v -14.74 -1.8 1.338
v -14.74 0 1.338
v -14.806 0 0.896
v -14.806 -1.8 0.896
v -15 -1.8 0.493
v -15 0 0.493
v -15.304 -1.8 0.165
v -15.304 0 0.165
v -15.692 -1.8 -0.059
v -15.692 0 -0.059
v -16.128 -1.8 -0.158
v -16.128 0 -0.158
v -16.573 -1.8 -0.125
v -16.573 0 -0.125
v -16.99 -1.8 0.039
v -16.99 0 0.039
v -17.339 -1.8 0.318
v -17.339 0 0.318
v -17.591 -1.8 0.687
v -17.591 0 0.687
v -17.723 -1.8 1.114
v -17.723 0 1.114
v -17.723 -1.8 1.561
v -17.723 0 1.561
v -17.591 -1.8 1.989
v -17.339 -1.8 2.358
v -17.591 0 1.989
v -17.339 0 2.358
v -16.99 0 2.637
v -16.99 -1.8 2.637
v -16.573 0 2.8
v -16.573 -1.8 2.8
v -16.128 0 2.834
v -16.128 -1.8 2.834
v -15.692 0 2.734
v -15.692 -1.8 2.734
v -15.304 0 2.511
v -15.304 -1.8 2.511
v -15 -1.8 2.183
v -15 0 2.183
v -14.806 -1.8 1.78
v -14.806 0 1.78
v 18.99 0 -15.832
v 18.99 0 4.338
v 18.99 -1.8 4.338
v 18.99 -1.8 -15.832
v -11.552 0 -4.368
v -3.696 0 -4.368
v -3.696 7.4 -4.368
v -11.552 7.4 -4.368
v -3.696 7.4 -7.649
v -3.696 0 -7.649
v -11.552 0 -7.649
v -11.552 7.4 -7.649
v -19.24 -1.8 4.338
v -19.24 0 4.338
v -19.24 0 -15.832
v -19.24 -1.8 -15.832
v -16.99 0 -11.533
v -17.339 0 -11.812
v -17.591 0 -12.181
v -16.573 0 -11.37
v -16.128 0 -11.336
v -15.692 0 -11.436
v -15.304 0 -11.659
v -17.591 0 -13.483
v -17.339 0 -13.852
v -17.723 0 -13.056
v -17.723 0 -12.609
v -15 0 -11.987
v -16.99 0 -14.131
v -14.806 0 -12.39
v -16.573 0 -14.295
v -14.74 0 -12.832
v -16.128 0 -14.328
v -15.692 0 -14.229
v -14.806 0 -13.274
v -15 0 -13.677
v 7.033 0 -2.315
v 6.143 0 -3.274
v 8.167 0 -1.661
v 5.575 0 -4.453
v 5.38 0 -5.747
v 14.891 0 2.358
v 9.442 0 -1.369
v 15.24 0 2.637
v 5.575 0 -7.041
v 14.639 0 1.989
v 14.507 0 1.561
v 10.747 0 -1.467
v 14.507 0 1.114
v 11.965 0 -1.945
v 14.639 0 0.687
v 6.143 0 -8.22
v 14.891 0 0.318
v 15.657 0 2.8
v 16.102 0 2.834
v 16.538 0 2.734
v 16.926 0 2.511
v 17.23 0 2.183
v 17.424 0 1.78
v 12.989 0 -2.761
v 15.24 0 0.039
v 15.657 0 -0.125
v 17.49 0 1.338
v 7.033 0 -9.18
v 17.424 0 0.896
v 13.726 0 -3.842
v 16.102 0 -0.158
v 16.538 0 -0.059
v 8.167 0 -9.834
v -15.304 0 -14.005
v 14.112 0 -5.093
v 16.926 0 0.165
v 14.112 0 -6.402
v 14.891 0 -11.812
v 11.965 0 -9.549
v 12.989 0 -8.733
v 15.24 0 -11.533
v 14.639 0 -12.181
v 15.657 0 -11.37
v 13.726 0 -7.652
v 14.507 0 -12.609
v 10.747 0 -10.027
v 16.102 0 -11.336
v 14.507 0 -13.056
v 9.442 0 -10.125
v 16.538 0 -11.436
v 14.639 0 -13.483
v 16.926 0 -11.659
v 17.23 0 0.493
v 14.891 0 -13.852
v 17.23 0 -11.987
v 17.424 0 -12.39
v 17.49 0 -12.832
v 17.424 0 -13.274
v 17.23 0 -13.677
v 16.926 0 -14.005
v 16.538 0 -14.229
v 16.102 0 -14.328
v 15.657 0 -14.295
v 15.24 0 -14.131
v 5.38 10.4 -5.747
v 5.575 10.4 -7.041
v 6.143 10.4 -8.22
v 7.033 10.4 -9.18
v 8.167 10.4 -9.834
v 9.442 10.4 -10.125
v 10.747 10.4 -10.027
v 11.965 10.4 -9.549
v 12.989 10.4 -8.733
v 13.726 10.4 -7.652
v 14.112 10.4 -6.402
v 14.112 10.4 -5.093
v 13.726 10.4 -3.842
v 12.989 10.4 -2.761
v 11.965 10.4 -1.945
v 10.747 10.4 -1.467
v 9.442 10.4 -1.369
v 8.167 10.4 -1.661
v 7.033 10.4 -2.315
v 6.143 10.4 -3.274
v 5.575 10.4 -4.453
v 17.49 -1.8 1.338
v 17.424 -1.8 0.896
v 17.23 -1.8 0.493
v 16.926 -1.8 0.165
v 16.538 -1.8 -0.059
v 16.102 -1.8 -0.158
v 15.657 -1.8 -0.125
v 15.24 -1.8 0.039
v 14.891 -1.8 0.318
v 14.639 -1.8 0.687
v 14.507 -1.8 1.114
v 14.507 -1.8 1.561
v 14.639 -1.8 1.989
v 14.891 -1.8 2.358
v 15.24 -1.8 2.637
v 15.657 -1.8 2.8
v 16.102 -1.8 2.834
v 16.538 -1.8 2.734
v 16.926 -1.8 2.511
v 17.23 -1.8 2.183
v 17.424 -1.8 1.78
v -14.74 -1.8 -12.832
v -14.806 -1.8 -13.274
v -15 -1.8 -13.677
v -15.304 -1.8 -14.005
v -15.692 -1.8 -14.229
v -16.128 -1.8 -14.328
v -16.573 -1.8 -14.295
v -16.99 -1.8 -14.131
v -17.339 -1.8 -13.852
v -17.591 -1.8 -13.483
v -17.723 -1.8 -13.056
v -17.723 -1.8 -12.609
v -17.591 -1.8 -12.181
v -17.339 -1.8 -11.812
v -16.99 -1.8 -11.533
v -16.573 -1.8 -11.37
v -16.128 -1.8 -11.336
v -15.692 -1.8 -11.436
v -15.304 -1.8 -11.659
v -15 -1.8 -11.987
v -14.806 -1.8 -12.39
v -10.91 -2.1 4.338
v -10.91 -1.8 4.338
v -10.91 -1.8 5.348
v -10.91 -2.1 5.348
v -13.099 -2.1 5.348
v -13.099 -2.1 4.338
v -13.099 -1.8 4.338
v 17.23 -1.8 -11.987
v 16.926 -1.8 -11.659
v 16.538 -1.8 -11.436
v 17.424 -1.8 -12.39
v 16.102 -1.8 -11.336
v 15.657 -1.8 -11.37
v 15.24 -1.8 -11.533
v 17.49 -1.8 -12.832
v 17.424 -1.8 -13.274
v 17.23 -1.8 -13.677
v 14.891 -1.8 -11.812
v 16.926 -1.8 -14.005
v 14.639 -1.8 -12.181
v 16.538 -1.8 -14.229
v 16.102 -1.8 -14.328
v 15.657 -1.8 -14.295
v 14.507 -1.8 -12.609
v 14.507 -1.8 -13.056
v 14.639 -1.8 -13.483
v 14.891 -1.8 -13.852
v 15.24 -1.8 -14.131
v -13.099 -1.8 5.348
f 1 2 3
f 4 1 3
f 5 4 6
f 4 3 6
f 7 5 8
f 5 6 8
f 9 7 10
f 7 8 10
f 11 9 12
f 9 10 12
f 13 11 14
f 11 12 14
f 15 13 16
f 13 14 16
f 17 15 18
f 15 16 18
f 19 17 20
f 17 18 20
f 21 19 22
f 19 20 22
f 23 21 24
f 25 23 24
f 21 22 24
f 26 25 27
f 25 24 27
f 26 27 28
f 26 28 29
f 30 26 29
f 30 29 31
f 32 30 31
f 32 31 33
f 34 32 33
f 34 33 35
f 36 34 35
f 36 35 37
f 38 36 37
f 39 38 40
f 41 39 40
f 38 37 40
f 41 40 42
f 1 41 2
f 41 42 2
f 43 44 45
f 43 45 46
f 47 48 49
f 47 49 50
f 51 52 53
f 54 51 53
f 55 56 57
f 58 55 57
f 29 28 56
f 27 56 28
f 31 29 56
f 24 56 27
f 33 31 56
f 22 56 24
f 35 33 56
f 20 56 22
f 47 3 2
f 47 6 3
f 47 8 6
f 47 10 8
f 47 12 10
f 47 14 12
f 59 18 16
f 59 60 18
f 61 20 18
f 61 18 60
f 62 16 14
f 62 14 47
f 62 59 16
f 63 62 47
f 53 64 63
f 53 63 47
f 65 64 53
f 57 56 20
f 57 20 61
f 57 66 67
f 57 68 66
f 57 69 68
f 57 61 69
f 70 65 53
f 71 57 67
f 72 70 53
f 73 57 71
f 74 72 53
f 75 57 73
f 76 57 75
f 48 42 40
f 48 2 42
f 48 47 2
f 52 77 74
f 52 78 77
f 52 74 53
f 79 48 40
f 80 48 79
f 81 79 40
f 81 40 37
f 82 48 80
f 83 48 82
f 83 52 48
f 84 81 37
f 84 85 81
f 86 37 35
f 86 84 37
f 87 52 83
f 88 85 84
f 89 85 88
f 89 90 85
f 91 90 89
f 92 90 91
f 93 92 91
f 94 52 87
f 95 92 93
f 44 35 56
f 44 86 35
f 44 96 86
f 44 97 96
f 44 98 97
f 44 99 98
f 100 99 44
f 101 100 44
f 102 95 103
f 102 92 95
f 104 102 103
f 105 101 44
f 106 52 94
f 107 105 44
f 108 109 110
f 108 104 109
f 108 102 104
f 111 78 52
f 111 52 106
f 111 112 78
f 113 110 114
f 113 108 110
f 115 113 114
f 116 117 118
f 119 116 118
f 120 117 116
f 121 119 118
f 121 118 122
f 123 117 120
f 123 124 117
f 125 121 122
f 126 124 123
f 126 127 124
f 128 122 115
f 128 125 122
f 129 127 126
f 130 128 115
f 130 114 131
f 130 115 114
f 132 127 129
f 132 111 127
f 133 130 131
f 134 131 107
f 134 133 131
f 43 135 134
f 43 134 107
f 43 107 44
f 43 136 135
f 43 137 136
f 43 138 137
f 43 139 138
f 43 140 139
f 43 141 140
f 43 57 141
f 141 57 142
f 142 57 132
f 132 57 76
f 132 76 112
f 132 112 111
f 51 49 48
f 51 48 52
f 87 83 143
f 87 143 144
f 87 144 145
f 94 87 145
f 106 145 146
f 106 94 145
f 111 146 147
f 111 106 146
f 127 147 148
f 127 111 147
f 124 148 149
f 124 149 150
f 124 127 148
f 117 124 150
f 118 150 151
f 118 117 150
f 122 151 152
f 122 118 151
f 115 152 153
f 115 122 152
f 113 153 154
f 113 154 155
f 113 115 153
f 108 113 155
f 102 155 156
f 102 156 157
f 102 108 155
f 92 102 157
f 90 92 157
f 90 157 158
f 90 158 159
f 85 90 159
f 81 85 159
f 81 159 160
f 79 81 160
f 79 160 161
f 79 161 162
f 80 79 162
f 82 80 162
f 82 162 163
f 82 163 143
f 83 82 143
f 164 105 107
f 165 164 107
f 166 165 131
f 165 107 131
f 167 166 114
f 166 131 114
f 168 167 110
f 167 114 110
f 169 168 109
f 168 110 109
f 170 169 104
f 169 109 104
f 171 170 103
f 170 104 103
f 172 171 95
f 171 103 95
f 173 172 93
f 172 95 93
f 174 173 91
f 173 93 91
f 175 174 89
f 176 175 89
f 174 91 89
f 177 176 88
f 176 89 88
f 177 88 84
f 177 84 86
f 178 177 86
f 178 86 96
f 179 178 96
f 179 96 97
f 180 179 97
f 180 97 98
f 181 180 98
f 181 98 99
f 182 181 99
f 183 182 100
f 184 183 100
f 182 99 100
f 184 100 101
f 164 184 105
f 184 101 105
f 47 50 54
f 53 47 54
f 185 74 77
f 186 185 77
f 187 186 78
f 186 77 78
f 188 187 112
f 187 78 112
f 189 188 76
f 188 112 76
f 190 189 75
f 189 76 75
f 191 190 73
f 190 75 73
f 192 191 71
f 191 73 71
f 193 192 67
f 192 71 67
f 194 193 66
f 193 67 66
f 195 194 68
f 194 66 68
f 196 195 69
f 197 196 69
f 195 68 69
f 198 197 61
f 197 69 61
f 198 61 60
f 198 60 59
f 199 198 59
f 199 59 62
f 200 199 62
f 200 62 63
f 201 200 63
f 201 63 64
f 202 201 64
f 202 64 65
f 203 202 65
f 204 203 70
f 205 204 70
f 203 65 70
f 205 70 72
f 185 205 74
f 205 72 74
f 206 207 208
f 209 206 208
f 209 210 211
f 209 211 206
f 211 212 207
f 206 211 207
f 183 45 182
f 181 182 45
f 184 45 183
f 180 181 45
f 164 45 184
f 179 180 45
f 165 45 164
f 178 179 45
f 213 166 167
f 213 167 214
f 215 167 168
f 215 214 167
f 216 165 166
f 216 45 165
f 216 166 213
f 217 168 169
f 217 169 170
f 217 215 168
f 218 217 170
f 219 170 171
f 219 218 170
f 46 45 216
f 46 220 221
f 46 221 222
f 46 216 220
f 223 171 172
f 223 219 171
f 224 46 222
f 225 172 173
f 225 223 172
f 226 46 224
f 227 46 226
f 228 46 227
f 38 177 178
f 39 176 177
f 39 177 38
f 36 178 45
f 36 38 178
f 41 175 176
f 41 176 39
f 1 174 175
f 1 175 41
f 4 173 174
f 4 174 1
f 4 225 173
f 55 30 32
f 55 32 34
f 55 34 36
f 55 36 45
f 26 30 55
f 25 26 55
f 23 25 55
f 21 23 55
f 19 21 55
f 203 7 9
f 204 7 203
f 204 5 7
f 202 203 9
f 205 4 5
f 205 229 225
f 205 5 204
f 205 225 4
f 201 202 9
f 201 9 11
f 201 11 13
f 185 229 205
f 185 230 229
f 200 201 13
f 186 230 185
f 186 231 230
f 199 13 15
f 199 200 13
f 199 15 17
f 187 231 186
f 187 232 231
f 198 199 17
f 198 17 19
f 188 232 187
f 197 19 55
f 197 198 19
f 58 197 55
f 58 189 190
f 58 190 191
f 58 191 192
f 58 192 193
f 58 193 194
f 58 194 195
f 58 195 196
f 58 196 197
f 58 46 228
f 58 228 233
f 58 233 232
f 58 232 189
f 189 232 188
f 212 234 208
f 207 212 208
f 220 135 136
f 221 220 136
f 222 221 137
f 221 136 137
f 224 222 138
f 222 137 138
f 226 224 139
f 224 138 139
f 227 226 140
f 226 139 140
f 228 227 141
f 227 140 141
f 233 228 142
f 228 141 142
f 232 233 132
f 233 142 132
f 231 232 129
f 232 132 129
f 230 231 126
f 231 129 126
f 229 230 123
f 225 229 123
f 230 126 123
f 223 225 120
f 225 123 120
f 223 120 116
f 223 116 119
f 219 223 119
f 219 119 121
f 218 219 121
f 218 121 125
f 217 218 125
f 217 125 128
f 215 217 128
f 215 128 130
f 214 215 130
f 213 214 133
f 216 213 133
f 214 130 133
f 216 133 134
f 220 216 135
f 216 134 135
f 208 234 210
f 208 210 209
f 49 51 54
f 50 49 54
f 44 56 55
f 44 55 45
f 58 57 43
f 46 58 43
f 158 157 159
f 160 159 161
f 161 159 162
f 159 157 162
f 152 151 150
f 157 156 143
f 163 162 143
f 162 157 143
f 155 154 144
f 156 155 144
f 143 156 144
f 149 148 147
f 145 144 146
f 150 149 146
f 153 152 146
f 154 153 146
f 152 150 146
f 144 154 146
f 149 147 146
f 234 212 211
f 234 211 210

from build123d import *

# Parameters (mm, degrees)
SKETCH1_W           = 38.23
SKETCH1_H           = 20.17
SKETCH1_R           = 1.5
BOSS_EXTRUDE1_DEPTH = 1.8
SKETCH5_W           = 2.189263985
SKETCH5_H           = 1.01
BOSS_EXTRUDE2_DEPTH = 0.3
SKETCH6_R           = 4.390112711
BOSS_EXTRUDE3_DEPTH = 12.2
SKETCH7_W           = 7.855644305
SKETCH7_H           = 3.28037894
BOSS_EXTRUDE4_DEPTH = 9.2


with BuildPart() as part:
    # Sketch1 → Boss-Extrude1 (new body)
    with BuildSketch(Plane(origin=(0, 0, 0), x_dir=(1, 0, 0), z_dir=(0, 1, 0))):
        with Locations((-0.124663043, 5.747206522)):
            Rectangle(SKETCH1_W, SKETCH1_H)
        with Locations((-16.239663043, 12.832206522)):
            Circle(SKETCH1_R, mode=Mode.SUBTRACT)
        with Locations((15.990336957, 12.832206522)):
            Circle(SKETCH1_R, mode=Mode.SUBTRACT)
        with Locations((15.990336957, -1.337793478)):
            Circle(SKETCH1_R, mode=Mode.SUBTRACT)
        with Locations((-16.239663043, -1.337793478)):
            Circle(SKETCH1_R, mode=Mode.SUBTRACT)
    extrude(amount=-BOSS_EXTRUDE1_DEPTH)

    # Sketch6 → Boss-Extrude3 (add)
    with BuildSketch(Plane(origin=(0, -1.8, 0), x_dir=(-1, 0, 0), z_dir=(0, -1, 0))):
        with Locations((-9.77042738, 5.747206522)):
            Circle(SKETCH6_R)
    extrude(amount=-BOSS_EXTRUDE3_DEPTH)

    # Sketch7 → Boss-Extrude4 (add)
    with BuildSketch(Plane(origin=(0, -1.8, 0), x_dir=(-1, 0, 0), z_dir=(0, -1, 0))):
        with Locations((7.624213583, 6.008347656)):
            Rectangle(SKETCH7_W, SKETCH7_H)
    extrude(amount=-BOSS_EXTRUDE4_DEPTH)


with BuildPart() as body_2:
    # Sketch5 → Boss-Extrude2 (new body)
    with BuildSketch(Plane.XZ.offset(1.8)):
        with Locations((-12.004217964, 4.842793478)):
            Rectangle(SKETCH5_W, SKETCH5_H)
    extrude(amount=BOSS_EXTRUDE2_DEPTH)


solid = Compound([part.part, body_2.part])
